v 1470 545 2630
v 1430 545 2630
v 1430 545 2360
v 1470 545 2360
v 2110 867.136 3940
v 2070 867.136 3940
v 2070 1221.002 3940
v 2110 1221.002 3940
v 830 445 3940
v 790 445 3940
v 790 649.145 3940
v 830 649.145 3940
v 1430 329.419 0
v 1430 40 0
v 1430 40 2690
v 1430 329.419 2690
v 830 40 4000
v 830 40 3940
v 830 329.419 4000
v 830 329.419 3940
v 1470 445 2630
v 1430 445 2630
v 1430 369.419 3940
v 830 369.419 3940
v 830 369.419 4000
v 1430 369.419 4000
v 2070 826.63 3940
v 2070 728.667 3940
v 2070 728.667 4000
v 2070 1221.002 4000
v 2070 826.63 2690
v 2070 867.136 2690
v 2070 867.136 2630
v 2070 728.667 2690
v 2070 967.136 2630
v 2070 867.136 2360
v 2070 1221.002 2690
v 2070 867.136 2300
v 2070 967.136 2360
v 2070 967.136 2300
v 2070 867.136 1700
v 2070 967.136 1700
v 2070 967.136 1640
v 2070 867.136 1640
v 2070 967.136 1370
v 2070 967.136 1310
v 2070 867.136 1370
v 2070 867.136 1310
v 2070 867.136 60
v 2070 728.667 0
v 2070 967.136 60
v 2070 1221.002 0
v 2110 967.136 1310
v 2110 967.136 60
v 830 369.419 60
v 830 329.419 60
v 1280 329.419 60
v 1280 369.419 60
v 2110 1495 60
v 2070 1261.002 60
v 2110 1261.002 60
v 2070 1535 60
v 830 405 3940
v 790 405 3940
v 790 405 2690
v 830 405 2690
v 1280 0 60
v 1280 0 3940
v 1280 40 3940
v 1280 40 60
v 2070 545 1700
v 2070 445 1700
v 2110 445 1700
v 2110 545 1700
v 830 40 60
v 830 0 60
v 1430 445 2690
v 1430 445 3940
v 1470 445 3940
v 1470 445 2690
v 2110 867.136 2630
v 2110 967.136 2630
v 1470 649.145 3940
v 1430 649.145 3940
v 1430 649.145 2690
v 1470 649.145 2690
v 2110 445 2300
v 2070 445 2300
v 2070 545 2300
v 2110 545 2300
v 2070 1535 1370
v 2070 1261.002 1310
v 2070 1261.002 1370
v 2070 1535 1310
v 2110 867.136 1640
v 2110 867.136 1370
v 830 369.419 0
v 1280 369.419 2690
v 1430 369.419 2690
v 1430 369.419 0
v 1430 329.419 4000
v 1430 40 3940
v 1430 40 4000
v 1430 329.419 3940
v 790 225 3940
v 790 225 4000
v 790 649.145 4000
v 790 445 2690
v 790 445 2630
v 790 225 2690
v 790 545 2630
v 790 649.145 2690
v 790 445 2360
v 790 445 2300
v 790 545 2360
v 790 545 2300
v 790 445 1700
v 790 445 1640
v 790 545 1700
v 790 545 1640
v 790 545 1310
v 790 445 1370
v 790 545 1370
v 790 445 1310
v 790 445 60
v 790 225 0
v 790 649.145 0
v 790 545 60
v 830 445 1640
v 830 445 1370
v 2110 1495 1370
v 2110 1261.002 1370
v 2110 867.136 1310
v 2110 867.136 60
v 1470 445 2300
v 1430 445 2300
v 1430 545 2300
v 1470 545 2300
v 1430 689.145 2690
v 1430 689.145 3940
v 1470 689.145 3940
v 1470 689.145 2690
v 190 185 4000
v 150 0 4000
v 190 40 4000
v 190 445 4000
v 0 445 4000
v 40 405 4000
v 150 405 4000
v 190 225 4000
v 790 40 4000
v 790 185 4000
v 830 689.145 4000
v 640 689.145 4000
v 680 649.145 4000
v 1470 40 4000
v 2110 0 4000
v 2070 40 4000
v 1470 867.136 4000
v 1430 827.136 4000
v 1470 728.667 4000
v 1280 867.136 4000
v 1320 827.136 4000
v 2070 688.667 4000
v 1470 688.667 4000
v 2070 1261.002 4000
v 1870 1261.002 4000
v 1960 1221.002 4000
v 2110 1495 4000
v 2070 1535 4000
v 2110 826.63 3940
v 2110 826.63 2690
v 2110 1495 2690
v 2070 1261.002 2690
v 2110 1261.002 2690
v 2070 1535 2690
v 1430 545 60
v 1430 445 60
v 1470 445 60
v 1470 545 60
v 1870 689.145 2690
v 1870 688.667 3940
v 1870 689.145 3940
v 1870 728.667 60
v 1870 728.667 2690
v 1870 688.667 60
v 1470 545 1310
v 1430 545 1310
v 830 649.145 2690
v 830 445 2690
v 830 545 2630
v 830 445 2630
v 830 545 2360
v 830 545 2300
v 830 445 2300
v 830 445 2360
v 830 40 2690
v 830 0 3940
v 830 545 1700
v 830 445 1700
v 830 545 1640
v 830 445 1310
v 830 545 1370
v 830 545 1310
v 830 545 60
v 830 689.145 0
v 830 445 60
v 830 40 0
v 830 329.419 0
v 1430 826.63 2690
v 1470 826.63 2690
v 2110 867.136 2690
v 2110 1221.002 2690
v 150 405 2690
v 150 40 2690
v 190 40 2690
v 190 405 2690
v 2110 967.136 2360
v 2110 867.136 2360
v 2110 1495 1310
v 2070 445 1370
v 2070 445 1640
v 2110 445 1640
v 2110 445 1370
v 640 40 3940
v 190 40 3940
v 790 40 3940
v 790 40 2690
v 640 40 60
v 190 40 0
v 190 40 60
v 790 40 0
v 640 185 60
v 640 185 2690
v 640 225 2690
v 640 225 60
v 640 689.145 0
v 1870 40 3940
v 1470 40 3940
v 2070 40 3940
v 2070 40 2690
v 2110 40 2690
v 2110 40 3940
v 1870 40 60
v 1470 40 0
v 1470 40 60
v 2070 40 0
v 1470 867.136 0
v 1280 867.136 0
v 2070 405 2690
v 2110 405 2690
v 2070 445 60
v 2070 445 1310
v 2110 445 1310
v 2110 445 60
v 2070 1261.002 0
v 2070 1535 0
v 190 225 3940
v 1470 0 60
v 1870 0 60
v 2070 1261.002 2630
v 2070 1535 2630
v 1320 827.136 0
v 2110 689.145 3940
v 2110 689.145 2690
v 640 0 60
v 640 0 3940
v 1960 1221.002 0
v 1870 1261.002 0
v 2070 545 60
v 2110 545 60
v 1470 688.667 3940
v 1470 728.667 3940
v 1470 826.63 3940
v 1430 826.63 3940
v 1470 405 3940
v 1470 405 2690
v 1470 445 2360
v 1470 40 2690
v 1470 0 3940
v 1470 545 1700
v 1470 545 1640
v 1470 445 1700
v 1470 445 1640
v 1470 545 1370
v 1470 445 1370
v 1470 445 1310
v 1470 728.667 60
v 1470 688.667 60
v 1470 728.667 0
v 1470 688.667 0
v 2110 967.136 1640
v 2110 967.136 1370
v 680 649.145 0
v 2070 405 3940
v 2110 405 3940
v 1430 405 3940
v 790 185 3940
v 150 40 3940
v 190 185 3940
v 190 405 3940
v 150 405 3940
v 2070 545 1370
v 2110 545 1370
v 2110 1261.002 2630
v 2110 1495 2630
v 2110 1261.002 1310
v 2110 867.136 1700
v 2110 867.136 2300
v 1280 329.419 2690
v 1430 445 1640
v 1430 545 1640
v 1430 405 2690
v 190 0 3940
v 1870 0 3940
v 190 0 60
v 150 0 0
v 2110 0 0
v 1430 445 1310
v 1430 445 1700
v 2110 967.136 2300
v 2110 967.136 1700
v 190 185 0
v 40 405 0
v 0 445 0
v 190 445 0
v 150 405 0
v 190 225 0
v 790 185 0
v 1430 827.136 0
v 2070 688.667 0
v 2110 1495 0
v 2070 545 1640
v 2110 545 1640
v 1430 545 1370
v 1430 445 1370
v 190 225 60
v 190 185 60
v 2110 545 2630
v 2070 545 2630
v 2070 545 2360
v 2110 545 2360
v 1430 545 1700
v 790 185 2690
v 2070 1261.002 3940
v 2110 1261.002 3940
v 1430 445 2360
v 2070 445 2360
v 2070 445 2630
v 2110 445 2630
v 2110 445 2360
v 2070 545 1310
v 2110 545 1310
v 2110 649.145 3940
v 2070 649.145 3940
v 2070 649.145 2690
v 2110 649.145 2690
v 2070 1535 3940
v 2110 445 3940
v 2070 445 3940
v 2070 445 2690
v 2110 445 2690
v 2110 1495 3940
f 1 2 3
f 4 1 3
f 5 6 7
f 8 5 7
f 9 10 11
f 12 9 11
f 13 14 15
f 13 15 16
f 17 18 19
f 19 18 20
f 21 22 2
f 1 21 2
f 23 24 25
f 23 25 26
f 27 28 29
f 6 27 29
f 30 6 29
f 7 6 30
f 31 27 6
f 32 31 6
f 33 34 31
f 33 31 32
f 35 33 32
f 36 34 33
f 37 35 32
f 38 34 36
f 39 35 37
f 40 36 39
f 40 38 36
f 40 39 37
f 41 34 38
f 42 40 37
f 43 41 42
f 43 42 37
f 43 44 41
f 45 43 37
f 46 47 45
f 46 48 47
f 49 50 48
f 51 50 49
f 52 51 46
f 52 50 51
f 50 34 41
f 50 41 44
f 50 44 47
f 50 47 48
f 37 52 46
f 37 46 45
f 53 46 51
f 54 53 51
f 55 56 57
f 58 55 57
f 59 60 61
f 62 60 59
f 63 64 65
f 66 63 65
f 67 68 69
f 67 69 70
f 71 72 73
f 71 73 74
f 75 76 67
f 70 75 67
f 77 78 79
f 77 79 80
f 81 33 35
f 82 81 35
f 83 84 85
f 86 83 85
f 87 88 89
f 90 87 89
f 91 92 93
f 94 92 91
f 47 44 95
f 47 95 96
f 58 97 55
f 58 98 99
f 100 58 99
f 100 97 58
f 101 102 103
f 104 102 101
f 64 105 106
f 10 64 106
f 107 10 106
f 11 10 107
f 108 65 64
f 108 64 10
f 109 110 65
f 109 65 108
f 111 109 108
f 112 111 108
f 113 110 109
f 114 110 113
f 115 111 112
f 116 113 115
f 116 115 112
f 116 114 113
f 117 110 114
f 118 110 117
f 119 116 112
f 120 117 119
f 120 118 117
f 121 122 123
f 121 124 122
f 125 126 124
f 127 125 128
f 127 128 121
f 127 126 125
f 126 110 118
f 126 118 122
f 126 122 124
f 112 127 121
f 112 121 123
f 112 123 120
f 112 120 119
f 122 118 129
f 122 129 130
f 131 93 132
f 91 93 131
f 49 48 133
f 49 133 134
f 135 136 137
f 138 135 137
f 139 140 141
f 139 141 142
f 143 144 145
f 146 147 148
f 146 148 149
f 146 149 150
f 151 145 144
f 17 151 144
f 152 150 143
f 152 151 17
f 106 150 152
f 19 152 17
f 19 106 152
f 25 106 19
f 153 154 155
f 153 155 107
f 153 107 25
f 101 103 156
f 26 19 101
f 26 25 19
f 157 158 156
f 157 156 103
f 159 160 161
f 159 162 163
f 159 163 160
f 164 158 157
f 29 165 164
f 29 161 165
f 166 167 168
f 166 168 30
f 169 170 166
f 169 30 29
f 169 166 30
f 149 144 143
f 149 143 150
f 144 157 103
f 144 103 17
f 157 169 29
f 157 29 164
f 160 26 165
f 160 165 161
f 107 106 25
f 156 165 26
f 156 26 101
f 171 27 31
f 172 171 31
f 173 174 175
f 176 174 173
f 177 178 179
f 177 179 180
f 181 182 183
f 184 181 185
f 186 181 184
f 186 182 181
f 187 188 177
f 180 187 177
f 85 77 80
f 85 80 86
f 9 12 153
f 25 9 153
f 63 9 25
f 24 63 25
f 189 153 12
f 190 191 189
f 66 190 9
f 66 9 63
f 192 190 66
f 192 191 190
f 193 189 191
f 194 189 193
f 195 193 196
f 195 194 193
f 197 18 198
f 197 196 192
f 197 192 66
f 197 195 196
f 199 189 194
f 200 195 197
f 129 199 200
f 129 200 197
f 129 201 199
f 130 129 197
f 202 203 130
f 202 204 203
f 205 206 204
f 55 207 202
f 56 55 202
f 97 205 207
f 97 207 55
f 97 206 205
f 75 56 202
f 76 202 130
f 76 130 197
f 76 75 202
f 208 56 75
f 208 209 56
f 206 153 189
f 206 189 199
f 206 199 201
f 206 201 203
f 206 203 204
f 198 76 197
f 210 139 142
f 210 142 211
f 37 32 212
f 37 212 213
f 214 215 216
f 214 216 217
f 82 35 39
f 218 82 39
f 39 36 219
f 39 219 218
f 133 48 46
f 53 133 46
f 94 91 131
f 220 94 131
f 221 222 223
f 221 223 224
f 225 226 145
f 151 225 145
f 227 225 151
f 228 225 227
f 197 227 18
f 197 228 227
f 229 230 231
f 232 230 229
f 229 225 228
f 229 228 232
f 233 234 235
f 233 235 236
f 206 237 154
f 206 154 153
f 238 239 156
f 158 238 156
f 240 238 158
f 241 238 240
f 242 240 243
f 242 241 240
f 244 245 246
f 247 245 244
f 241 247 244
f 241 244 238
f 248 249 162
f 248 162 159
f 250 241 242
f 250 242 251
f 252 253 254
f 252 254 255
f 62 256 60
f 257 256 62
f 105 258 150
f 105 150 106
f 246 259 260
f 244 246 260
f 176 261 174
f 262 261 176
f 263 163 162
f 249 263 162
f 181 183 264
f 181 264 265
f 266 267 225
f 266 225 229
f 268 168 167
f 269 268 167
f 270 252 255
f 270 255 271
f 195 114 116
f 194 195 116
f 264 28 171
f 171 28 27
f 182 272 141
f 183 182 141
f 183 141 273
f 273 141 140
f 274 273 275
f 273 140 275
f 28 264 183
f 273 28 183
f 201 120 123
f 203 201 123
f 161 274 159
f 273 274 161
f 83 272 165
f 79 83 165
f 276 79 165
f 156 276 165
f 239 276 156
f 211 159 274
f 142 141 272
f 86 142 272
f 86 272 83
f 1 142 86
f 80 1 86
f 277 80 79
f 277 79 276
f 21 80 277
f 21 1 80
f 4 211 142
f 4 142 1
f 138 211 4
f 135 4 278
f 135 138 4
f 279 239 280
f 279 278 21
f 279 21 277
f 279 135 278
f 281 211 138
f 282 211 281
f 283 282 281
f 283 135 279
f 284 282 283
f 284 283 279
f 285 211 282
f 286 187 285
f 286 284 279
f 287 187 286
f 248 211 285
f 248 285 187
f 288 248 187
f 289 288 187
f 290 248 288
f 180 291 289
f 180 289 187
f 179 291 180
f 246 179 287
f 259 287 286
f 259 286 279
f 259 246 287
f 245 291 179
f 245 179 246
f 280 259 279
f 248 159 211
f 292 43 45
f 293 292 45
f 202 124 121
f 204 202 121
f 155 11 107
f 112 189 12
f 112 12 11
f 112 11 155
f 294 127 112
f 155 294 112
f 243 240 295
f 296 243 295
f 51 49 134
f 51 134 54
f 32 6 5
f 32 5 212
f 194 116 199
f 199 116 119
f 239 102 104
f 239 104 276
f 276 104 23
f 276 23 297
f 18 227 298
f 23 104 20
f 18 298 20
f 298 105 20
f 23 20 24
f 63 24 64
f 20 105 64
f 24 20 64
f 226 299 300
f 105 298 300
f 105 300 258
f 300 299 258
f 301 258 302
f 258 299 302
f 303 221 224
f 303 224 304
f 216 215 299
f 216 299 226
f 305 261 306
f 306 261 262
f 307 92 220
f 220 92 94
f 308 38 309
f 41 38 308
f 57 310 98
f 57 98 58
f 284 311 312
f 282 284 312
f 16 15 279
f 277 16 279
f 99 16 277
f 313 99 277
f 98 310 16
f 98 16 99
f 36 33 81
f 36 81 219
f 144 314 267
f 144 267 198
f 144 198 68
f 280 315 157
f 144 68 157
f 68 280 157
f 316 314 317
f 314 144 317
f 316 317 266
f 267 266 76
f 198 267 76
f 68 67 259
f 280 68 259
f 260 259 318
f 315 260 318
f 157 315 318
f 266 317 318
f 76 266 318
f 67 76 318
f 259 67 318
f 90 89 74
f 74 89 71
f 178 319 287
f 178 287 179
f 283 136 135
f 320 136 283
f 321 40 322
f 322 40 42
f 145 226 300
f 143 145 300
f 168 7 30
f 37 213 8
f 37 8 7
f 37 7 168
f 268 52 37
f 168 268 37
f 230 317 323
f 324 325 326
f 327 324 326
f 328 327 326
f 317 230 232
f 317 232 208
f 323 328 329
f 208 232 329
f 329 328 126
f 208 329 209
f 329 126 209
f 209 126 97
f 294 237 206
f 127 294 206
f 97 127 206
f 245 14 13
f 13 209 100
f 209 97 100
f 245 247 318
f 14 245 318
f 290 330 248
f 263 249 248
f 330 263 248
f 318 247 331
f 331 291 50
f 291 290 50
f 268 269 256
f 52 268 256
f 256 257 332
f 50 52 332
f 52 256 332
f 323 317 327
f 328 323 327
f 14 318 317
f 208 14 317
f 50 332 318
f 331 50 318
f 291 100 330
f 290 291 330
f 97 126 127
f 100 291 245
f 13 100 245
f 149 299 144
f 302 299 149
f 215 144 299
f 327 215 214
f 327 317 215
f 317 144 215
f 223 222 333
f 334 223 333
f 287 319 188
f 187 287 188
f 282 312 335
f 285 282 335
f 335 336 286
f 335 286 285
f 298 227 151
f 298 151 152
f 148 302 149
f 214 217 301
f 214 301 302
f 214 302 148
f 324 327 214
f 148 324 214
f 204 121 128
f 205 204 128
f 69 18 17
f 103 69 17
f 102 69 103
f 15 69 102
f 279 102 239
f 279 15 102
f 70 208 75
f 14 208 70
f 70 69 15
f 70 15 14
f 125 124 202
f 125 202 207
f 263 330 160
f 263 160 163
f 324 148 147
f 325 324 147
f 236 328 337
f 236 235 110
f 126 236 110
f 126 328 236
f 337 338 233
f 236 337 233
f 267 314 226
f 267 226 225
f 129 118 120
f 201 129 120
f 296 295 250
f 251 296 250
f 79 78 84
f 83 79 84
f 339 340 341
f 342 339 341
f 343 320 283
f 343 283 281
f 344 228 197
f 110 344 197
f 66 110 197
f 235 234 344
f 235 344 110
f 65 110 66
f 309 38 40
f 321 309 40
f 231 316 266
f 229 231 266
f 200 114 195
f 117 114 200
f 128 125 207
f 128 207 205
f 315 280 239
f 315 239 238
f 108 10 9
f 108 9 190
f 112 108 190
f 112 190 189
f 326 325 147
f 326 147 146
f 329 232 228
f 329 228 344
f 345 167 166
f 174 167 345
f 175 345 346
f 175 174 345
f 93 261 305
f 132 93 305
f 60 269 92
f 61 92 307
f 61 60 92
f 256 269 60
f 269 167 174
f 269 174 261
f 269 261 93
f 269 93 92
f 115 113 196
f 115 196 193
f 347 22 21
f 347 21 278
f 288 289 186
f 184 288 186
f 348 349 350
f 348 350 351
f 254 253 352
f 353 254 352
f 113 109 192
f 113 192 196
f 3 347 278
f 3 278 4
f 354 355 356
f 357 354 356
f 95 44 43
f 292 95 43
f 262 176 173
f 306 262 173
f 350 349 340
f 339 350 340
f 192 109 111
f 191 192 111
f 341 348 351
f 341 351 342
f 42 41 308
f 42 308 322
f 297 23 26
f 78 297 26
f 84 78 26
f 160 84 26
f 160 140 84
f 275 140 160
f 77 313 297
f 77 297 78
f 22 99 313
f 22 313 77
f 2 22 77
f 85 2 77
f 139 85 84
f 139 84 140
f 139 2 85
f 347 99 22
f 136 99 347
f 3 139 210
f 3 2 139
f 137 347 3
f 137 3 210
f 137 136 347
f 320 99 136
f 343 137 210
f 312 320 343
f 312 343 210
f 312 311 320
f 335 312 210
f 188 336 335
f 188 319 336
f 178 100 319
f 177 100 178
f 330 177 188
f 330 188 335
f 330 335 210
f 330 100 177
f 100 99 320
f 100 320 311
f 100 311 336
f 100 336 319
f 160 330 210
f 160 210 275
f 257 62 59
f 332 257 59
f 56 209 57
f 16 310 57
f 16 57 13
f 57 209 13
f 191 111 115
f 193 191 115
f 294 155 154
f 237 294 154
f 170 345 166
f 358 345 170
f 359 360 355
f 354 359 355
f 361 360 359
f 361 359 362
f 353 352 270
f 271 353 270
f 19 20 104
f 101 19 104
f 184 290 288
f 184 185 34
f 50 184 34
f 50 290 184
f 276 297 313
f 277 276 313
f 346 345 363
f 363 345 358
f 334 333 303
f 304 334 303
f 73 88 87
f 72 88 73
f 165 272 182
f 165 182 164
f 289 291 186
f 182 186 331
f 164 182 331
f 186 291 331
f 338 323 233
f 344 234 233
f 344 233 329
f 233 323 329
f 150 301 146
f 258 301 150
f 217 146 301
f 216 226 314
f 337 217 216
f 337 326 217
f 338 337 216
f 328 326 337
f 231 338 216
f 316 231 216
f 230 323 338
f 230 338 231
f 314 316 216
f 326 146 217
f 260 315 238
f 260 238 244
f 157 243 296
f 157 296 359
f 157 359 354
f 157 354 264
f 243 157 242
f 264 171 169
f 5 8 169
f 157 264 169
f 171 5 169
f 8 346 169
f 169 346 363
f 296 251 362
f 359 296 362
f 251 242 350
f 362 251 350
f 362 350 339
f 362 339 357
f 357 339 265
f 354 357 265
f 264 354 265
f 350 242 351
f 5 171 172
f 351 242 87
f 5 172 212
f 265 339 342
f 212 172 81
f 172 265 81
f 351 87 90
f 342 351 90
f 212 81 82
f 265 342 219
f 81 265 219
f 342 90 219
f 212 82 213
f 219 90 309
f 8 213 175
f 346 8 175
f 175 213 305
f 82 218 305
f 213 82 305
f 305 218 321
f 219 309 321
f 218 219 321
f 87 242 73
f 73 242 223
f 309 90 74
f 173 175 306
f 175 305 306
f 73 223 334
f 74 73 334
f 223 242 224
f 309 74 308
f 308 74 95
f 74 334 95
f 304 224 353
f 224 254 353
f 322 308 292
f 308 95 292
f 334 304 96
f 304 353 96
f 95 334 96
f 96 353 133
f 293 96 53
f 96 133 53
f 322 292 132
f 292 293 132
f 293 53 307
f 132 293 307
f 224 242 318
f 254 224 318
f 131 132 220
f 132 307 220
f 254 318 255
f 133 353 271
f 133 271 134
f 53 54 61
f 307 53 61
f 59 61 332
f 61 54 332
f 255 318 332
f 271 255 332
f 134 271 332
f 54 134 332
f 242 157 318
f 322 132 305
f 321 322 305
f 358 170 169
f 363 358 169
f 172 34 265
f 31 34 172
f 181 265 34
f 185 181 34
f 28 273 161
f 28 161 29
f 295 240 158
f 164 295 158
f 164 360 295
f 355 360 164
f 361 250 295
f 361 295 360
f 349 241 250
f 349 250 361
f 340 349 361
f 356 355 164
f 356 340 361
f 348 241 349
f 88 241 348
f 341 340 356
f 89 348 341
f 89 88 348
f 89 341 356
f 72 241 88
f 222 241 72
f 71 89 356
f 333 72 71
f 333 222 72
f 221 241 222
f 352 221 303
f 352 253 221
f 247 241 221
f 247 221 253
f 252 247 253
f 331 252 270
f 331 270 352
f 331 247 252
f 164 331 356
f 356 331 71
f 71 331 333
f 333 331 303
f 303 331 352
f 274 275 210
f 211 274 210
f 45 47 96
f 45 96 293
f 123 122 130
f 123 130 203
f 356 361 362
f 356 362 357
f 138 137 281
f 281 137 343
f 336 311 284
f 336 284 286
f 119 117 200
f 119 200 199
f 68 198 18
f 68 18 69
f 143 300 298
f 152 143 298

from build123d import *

# Parameters (mm, degrees)
ESQUISSE1_W              = 2110
ESQUISSE1_H              = 1535
BOSS_EXTRU_1_DEPTH       = 4000
ESQUISSE2_OUTSIDE_W      = 3067.162
ESQUISSE2_OUTSIDE_H      = 2492.162
ESQUISSE2_OUTSIDE_W_2    = 600
ESQUISSE2_OUTSIDE_H_2    = 289.418976122
ESQUISSE2_OUTSIDE_H_3    = 145
ESQUISSE2_OUTSIDE_H_4    = 648.667318714
ENL_V_MAT_EXTRU_1_DEPTH  = 4776.806214662
ESQUISSE3_W              = 1250
ESQUISSE3_H              = 137.484664561
ESQUISSE3_H_2            = 100
ESQUISSE3_W_2            = 270
ESQUISSE3_W_3            = 600
ESQUISSE3_H_3            = 353.865632752
ESQUISSE3_H_4            = 390
ESQUISSE3_W_4            = 1260
ESQUISSE3_H_5            = 490
ESQUISSE3_H_6            = 365
ESQUISSE3_H_7            = 204.145056892
ENL_V_MAT_EXTRU_11_DEPTH = 4000
ESQUISSE4_W              = 450
ESQUISSE4_H              = 3880
ESQUISSE4_W_2            = 400
ENL_V_MAT_EXTRU_13_DEPTH = 1800


with BuildPart() as part:
    # Esquisse1 → Boss.-Extru.1 (new body)
    with BuildSketch(Plane.XY):
        with Locations((1055, 767.5)):
            Rectangle(ESQUISSE1_W, ESQUISSE1_H)
    extrude(amount=BOSS_EXTRU_1_DEPTH)

    # Esquisse2 outside → Enlèv. mat.-Extru.1 (cut, through all)
    # profile 1 of 4: a face of its own
    with BuildSketch(Plane.XY):
        with Locations((1055, 767.5)):
            Rectangle(ESQUISSE2_OUTSIDE_W, ESQUISSE2_OUTSIDE_H)
        Polygon((190, 225), (790, 225), (790, 649.145056892), (680, 649.145056892), (640, 689.145056892), (830, 689.145056892), (830, 369.418976122), (1430, 369.418976122), (1430, 827.136479357), (1320, 827.136479357), (1280, 867.136479357), (1470, 867.136479357), (1470, 728.667318714), (2070, 728.667318714), (2070, 1221.002112109), (1960, 1221.002112109), (1870, 1261.002112109), (2070, 1261.002112109), (2070, 1535), (2110, 1495), (2110, 0), (150, 0), (150, 405), (40, 405), (0, 445), (190, 445), align=None, mode=Mode.SUBTRACT)
    # profile 2 of 4: a face of its own
    with BuildSketch(Plane.XY):
        with Locations((1130, 184.709488061)):
            Rectangle(ESQUISSE2_OUTSIDE_W_2, ESQUISSE2_OUTSIDE_H_2)
    # profile 3 of 4: a face of its own
    with BuildSketch(Plane.XY):
        with Locations((490, 112.5)):
            Rectangle(ESQUISSE2_OUTSIDE_W_2, ESQUISSE2_OUTSIDE_H_3)
    # profile 4 of 4: a face of its own
    with BuildSketch(Plane.XY):
        with Locations((1770, 364.333659357)):
            Rectangle(ESQUISSE2_OUTSIDE_W_2, ESQUISSE2_OUTSIDE_H_4)
    extrude(amount=ENL_V_MAT_EXTRU_1_DEPTH, mode=Mode.SUBTRACT)

    # Esquisse3 → Enlèv. mat.-Extru.11 (cut)
    with BuildSketch(Plane(origin=(0, 0, 0), x_dir=(0, 0, -1), z_dir=(1, 0, 0))):
        with Locations((-3315, 757.887389172)):
            Rectangle(ESQUISSE3_W, ESQUISSE3_H)
        with Locations((-685, 495)):
            Rectangle(ESQUISSE3_W, ESQUISSE3_H_2)
        with Locations((-1505, 495)):
            Rectangle(ESQUISSE3_W_2, ESQUISSE3_H_2)
        with Locations((-2000, 495)):
            Rectangle(ESQUISSE3_W_3, ESQUISSE3_H_2)
        with Locations((-2495, 495)):
            Rectangle(ESQUISSE3_W_2, ESQUISSE3_H_2)
        with Locations((-685, 917.136479357)):
            Rectangle(ESQUISSE3_W, ESQUISSE3_H_2)
        with Locations((-1505, 917.136479357)):
            Rectangle(ESQUISSE3_W_2, ESQUISSE3_H_2)
        with Locations((-2000, 917.136479357)):
            Rectangle(ESQUISSE3_W_3, ESQUISSE3_H_2)
        with Locations((-2495, 917.136479357)):
            Rectangle(ESQUISSE3_W_2, ESQUISSE3_H_2)
        with Locations((-3315, 1044.069295733)):
            Rectangle(ESQUISSE3_W, ESQUISSE3_H_3)
        with Locations((-685, 1456.002112109)):
            Rectangle(ESQUISSE3_W, ESQUISSE3_H_4)
        with Locations((-2000, 1456.002112109)):
            Rectangle(ESQUISSE3_W_4, ESQUISSE3_H_4)
        with Locations((-3315, 1506.002112109)):
            Rectangle(ESQUISSE3_W, ESQUISSE3_H_5)
        with Locations((-3315, 222.5)):
            Rectangle(ESQUISSE3_W, ESQUISSE3_H_6)
        with Locations((-3315, 547.072528446)):
            Rectangle(ESQUISSE3_W, ESQUISSE3_H_7)
    extrude(amount=ENL_V_MAT_EXTRU_11_DEPTH, mode=Mode.SUBTRACT)

    # Esquisse4 → Enlèv. mat.-Extru.13 (cut)
    with BuildSketch(Plane(origin=(0, 0, 0), x_dir=(1, 0, 0), z_dir=(0, 1, 0))):
        with Locations((415, -2000)):
            Rectangle(ESQUISSE4_W, ESQUISSE4_H)
        with Locations((1055, -2000)):
            Rectangle(ESQUISSE4_W, ESQUISSE4_H)
        with Locations((1670, -2000)):
            Rectangle(ESQUISSE4_W_2, ESQUISSE4_H)
    extrude(amount=ENL_V_MAT_EXTRU_13_DEPTH, mode=Mode.SUBTRACT)


solid = part.part
